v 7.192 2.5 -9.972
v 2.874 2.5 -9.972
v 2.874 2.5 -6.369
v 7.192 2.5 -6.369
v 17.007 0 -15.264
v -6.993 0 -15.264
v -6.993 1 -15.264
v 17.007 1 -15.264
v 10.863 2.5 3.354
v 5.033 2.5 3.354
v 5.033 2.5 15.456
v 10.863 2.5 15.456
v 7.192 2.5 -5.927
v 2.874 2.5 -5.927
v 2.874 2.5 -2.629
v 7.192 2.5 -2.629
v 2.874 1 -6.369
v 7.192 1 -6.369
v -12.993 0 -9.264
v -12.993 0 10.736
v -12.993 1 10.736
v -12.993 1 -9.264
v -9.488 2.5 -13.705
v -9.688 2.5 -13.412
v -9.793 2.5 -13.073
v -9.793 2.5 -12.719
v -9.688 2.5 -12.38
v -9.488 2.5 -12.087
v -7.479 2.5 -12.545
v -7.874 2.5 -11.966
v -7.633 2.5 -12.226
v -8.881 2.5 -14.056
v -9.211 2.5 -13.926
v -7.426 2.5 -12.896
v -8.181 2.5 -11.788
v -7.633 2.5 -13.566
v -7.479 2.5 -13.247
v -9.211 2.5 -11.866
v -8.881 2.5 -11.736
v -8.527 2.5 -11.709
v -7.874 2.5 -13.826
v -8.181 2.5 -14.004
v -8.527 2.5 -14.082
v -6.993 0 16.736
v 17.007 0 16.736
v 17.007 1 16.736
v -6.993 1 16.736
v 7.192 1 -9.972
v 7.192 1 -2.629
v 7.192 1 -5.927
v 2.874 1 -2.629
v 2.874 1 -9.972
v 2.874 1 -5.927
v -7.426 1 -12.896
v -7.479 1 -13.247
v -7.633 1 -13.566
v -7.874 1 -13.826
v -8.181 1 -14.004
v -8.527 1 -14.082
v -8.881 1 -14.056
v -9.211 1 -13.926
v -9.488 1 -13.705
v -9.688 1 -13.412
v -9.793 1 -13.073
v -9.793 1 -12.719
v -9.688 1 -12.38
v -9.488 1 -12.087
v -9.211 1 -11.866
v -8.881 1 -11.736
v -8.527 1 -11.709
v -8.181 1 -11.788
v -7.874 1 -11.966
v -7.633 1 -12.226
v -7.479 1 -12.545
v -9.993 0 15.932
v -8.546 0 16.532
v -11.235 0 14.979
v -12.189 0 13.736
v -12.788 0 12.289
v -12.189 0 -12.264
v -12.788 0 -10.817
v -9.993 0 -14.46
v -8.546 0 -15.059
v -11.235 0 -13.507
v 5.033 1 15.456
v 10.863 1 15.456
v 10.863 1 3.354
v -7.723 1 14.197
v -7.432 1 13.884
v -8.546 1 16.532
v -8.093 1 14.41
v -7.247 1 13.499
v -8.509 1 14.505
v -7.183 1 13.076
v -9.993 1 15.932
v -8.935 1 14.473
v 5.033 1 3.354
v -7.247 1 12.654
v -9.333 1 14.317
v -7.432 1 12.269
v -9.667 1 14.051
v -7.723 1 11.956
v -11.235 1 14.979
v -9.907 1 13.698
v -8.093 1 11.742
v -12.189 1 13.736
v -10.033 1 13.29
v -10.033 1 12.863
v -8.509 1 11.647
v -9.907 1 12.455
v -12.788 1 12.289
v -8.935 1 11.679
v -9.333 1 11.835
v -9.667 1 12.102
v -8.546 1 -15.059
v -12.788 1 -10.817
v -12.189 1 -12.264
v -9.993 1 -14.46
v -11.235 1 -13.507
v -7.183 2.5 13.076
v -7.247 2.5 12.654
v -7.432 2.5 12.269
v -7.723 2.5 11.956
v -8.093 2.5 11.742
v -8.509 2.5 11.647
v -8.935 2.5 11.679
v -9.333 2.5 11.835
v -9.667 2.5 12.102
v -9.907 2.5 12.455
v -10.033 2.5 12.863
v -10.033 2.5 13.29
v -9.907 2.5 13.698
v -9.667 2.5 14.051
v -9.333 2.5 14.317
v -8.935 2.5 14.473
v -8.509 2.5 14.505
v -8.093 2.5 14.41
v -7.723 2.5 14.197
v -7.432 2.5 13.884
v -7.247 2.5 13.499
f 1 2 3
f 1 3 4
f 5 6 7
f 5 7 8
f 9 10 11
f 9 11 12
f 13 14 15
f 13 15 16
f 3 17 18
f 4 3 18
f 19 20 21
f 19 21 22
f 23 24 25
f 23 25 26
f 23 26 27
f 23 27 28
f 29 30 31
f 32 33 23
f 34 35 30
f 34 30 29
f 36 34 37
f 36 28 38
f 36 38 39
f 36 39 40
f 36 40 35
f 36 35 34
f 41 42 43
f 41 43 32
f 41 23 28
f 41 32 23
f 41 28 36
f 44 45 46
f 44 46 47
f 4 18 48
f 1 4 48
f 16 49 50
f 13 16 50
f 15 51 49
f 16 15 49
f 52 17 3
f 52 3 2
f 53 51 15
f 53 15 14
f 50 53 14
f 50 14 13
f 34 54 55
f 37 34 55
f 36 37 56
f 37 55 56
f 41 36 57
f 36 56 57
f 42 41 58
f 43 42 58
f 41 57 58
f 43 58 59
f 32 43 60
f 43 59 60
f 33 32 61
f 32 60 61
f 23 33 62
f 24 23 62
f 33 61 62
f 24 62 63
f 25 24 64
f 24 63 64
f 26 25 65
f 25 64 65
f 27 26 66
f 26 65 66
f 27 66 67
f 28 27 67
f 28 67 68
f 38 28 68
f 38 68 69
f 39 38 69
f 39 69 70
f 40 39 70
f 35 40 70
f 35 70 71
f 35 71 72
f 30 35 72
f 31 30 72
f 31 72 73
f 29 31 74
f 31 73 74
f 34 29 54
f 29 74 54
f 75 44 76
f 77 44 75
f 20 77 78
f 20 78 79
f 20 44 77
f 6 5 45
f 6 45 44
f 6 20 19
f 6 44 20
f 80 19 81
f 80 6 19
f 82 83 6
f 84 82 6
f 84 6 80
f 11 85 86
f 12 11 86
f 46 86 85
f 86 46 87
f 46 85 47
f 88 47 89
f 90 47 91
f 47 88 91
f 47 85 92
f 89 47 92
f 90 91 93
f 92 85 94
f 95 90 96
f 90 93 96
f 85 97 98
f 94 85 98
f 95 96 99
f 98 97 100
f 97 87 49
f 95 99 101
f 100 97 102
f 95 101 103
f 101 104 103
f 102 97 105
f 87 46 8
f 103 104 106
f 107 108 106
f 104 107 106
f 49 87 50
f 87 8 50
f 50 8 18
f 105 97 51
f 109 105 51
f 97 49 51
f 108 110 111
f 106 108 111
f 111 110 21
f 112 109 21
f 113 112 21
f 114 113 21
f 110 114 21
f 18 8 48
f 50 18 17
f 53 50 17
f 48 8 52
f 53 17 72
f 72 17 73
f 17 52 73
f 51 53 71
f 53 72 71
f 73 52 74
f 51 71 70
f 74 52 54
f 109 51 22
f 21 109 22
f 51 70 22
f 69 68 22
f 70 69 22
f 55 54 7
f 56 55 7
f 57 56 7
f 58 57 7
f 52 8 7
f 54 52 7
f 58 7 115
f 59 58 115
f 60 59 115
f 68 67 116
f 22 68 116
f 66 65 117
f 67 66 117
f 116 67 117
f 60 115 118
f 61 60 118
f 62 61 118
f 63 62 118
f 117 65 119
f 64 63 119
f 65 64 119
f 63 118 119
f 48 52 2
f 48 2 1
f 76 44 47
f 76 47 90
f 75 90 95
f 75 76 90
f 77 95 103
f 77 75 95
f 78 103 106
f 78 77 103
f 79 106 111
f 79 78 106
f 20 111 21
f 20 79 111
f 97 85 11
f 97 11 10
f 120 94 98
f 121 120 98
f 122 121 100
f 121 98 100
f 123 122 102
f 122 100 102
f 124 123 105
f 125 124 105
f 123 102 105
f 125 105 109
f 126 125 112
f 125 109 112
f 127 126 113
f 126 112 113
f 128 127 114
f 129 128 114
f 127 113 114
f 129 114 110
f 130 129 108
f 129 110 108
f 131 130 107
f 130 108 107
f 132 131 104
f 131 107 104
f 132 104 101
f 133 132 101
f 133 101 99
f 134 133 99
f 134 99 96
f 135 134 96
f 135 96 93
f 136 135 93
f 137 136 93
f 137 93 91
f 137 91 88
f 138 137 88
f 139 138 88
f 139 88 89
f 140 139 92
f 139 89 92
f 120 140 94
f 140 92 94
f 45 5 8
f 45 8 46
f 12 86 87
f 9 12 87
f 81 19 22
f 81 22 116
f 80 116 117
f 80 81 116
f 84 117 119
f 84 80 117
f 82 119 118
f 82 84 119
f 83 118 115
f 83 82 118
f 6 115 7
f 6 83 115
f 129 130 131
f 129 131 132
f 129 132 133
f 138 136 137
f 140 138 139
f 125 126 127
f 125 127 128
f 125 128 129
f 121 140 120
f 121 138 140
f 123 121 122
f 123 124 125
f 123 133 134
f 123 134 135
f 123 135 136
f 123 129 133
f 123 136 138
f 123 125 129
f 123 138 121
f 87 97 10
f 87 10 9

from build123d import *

# Parameters (mm, degrees)
BOSS_EXTRUDE1_DEPTH = 1
SKETCH2_W           = 4.317372505
SKETCH2_H           = 3.603476264
SKETCH2_H_2         = 3.297520732
SKETCH2_W_2         = 5.830152634
SKETCH2_H_3         = 12.102241037
BOSS_EXTRUDE2_DEPTH = 1.5
SKETCH3_R           = 1.433043964
SKETCH3_R_2         = 1.189827068
BOSS_EXTRUDE3_DEPTH = 1.5


with BuildPart() as part:
    # Sketch1 → Boss-Extrude1 (new body)
    with BuildSketch(Plane(origin=(0, 0, 0), x_dir=(1, 0, 0), z_dir=(0, 1, 0))):
        with BuildLine():
            Line((-6.992736077, 15.263922518), (17.007263923, 15.263922518))
            Line((17.007263923, 15.263922518), (17.007263923, -16.736077482))
            Line((17.007263923, -16.736077482), (-6.992736077, -16.736077482))
            ThreePointArc((-6.992736077, -16.736077482), (-11.235376765, -14.978718169), (-12.992736077, -10.736077482))
            Line((-12.992736077, -10.736077482), (-12.992736077, 9.263922518))
            ThreePointArc((-12.992736077, 9.263922518), (-11.235376765, 13.506563205), (-6.992736077, 15.263922518))
        make_face()
    extrude(amount=BOSS_EXTRUDE1_DEPTH)

    # Sketch2 → Boss-Extrude2 (add)
    with BuildSketch(Plane(origin=(0, 1, 0), x_dir=(1, 0, 0), z_dir=(0, 1, 0))):
        with Locations((5.032824182, 8.170628001)):
            Rectangle(SKETCH2_W, SKETCH2_H)
        with Locations((5.032824182, 4.278193734)):
            Rectangle(SKETCH2_W, SKETCH2_H_2)
        with Locations((7.947900499, -9.404817551)):
            Rectangle(SKETCH2_W_2, SKETCH2_H_3)
    extrude(amount=BOSS_EXTRUDE2_DEPTH)

    # Sketch3 → Boss-Extrude3 (add)
    with BuildSketch(Plane(origin=(0, 1, 0), x_dir=(1, 0, 0), z_dir=(0, 1, 0))):
        with Locations((-8.616192044, -13.076283933)):
            Circle(SKETCH3_R)
        with Locations((-8.616192044, 12.895941215)):
            Circle(SKETCH3_R_2)
    extrude(amount=BOSS_EXTRUDE3_DEPTH)


solid = part.part
